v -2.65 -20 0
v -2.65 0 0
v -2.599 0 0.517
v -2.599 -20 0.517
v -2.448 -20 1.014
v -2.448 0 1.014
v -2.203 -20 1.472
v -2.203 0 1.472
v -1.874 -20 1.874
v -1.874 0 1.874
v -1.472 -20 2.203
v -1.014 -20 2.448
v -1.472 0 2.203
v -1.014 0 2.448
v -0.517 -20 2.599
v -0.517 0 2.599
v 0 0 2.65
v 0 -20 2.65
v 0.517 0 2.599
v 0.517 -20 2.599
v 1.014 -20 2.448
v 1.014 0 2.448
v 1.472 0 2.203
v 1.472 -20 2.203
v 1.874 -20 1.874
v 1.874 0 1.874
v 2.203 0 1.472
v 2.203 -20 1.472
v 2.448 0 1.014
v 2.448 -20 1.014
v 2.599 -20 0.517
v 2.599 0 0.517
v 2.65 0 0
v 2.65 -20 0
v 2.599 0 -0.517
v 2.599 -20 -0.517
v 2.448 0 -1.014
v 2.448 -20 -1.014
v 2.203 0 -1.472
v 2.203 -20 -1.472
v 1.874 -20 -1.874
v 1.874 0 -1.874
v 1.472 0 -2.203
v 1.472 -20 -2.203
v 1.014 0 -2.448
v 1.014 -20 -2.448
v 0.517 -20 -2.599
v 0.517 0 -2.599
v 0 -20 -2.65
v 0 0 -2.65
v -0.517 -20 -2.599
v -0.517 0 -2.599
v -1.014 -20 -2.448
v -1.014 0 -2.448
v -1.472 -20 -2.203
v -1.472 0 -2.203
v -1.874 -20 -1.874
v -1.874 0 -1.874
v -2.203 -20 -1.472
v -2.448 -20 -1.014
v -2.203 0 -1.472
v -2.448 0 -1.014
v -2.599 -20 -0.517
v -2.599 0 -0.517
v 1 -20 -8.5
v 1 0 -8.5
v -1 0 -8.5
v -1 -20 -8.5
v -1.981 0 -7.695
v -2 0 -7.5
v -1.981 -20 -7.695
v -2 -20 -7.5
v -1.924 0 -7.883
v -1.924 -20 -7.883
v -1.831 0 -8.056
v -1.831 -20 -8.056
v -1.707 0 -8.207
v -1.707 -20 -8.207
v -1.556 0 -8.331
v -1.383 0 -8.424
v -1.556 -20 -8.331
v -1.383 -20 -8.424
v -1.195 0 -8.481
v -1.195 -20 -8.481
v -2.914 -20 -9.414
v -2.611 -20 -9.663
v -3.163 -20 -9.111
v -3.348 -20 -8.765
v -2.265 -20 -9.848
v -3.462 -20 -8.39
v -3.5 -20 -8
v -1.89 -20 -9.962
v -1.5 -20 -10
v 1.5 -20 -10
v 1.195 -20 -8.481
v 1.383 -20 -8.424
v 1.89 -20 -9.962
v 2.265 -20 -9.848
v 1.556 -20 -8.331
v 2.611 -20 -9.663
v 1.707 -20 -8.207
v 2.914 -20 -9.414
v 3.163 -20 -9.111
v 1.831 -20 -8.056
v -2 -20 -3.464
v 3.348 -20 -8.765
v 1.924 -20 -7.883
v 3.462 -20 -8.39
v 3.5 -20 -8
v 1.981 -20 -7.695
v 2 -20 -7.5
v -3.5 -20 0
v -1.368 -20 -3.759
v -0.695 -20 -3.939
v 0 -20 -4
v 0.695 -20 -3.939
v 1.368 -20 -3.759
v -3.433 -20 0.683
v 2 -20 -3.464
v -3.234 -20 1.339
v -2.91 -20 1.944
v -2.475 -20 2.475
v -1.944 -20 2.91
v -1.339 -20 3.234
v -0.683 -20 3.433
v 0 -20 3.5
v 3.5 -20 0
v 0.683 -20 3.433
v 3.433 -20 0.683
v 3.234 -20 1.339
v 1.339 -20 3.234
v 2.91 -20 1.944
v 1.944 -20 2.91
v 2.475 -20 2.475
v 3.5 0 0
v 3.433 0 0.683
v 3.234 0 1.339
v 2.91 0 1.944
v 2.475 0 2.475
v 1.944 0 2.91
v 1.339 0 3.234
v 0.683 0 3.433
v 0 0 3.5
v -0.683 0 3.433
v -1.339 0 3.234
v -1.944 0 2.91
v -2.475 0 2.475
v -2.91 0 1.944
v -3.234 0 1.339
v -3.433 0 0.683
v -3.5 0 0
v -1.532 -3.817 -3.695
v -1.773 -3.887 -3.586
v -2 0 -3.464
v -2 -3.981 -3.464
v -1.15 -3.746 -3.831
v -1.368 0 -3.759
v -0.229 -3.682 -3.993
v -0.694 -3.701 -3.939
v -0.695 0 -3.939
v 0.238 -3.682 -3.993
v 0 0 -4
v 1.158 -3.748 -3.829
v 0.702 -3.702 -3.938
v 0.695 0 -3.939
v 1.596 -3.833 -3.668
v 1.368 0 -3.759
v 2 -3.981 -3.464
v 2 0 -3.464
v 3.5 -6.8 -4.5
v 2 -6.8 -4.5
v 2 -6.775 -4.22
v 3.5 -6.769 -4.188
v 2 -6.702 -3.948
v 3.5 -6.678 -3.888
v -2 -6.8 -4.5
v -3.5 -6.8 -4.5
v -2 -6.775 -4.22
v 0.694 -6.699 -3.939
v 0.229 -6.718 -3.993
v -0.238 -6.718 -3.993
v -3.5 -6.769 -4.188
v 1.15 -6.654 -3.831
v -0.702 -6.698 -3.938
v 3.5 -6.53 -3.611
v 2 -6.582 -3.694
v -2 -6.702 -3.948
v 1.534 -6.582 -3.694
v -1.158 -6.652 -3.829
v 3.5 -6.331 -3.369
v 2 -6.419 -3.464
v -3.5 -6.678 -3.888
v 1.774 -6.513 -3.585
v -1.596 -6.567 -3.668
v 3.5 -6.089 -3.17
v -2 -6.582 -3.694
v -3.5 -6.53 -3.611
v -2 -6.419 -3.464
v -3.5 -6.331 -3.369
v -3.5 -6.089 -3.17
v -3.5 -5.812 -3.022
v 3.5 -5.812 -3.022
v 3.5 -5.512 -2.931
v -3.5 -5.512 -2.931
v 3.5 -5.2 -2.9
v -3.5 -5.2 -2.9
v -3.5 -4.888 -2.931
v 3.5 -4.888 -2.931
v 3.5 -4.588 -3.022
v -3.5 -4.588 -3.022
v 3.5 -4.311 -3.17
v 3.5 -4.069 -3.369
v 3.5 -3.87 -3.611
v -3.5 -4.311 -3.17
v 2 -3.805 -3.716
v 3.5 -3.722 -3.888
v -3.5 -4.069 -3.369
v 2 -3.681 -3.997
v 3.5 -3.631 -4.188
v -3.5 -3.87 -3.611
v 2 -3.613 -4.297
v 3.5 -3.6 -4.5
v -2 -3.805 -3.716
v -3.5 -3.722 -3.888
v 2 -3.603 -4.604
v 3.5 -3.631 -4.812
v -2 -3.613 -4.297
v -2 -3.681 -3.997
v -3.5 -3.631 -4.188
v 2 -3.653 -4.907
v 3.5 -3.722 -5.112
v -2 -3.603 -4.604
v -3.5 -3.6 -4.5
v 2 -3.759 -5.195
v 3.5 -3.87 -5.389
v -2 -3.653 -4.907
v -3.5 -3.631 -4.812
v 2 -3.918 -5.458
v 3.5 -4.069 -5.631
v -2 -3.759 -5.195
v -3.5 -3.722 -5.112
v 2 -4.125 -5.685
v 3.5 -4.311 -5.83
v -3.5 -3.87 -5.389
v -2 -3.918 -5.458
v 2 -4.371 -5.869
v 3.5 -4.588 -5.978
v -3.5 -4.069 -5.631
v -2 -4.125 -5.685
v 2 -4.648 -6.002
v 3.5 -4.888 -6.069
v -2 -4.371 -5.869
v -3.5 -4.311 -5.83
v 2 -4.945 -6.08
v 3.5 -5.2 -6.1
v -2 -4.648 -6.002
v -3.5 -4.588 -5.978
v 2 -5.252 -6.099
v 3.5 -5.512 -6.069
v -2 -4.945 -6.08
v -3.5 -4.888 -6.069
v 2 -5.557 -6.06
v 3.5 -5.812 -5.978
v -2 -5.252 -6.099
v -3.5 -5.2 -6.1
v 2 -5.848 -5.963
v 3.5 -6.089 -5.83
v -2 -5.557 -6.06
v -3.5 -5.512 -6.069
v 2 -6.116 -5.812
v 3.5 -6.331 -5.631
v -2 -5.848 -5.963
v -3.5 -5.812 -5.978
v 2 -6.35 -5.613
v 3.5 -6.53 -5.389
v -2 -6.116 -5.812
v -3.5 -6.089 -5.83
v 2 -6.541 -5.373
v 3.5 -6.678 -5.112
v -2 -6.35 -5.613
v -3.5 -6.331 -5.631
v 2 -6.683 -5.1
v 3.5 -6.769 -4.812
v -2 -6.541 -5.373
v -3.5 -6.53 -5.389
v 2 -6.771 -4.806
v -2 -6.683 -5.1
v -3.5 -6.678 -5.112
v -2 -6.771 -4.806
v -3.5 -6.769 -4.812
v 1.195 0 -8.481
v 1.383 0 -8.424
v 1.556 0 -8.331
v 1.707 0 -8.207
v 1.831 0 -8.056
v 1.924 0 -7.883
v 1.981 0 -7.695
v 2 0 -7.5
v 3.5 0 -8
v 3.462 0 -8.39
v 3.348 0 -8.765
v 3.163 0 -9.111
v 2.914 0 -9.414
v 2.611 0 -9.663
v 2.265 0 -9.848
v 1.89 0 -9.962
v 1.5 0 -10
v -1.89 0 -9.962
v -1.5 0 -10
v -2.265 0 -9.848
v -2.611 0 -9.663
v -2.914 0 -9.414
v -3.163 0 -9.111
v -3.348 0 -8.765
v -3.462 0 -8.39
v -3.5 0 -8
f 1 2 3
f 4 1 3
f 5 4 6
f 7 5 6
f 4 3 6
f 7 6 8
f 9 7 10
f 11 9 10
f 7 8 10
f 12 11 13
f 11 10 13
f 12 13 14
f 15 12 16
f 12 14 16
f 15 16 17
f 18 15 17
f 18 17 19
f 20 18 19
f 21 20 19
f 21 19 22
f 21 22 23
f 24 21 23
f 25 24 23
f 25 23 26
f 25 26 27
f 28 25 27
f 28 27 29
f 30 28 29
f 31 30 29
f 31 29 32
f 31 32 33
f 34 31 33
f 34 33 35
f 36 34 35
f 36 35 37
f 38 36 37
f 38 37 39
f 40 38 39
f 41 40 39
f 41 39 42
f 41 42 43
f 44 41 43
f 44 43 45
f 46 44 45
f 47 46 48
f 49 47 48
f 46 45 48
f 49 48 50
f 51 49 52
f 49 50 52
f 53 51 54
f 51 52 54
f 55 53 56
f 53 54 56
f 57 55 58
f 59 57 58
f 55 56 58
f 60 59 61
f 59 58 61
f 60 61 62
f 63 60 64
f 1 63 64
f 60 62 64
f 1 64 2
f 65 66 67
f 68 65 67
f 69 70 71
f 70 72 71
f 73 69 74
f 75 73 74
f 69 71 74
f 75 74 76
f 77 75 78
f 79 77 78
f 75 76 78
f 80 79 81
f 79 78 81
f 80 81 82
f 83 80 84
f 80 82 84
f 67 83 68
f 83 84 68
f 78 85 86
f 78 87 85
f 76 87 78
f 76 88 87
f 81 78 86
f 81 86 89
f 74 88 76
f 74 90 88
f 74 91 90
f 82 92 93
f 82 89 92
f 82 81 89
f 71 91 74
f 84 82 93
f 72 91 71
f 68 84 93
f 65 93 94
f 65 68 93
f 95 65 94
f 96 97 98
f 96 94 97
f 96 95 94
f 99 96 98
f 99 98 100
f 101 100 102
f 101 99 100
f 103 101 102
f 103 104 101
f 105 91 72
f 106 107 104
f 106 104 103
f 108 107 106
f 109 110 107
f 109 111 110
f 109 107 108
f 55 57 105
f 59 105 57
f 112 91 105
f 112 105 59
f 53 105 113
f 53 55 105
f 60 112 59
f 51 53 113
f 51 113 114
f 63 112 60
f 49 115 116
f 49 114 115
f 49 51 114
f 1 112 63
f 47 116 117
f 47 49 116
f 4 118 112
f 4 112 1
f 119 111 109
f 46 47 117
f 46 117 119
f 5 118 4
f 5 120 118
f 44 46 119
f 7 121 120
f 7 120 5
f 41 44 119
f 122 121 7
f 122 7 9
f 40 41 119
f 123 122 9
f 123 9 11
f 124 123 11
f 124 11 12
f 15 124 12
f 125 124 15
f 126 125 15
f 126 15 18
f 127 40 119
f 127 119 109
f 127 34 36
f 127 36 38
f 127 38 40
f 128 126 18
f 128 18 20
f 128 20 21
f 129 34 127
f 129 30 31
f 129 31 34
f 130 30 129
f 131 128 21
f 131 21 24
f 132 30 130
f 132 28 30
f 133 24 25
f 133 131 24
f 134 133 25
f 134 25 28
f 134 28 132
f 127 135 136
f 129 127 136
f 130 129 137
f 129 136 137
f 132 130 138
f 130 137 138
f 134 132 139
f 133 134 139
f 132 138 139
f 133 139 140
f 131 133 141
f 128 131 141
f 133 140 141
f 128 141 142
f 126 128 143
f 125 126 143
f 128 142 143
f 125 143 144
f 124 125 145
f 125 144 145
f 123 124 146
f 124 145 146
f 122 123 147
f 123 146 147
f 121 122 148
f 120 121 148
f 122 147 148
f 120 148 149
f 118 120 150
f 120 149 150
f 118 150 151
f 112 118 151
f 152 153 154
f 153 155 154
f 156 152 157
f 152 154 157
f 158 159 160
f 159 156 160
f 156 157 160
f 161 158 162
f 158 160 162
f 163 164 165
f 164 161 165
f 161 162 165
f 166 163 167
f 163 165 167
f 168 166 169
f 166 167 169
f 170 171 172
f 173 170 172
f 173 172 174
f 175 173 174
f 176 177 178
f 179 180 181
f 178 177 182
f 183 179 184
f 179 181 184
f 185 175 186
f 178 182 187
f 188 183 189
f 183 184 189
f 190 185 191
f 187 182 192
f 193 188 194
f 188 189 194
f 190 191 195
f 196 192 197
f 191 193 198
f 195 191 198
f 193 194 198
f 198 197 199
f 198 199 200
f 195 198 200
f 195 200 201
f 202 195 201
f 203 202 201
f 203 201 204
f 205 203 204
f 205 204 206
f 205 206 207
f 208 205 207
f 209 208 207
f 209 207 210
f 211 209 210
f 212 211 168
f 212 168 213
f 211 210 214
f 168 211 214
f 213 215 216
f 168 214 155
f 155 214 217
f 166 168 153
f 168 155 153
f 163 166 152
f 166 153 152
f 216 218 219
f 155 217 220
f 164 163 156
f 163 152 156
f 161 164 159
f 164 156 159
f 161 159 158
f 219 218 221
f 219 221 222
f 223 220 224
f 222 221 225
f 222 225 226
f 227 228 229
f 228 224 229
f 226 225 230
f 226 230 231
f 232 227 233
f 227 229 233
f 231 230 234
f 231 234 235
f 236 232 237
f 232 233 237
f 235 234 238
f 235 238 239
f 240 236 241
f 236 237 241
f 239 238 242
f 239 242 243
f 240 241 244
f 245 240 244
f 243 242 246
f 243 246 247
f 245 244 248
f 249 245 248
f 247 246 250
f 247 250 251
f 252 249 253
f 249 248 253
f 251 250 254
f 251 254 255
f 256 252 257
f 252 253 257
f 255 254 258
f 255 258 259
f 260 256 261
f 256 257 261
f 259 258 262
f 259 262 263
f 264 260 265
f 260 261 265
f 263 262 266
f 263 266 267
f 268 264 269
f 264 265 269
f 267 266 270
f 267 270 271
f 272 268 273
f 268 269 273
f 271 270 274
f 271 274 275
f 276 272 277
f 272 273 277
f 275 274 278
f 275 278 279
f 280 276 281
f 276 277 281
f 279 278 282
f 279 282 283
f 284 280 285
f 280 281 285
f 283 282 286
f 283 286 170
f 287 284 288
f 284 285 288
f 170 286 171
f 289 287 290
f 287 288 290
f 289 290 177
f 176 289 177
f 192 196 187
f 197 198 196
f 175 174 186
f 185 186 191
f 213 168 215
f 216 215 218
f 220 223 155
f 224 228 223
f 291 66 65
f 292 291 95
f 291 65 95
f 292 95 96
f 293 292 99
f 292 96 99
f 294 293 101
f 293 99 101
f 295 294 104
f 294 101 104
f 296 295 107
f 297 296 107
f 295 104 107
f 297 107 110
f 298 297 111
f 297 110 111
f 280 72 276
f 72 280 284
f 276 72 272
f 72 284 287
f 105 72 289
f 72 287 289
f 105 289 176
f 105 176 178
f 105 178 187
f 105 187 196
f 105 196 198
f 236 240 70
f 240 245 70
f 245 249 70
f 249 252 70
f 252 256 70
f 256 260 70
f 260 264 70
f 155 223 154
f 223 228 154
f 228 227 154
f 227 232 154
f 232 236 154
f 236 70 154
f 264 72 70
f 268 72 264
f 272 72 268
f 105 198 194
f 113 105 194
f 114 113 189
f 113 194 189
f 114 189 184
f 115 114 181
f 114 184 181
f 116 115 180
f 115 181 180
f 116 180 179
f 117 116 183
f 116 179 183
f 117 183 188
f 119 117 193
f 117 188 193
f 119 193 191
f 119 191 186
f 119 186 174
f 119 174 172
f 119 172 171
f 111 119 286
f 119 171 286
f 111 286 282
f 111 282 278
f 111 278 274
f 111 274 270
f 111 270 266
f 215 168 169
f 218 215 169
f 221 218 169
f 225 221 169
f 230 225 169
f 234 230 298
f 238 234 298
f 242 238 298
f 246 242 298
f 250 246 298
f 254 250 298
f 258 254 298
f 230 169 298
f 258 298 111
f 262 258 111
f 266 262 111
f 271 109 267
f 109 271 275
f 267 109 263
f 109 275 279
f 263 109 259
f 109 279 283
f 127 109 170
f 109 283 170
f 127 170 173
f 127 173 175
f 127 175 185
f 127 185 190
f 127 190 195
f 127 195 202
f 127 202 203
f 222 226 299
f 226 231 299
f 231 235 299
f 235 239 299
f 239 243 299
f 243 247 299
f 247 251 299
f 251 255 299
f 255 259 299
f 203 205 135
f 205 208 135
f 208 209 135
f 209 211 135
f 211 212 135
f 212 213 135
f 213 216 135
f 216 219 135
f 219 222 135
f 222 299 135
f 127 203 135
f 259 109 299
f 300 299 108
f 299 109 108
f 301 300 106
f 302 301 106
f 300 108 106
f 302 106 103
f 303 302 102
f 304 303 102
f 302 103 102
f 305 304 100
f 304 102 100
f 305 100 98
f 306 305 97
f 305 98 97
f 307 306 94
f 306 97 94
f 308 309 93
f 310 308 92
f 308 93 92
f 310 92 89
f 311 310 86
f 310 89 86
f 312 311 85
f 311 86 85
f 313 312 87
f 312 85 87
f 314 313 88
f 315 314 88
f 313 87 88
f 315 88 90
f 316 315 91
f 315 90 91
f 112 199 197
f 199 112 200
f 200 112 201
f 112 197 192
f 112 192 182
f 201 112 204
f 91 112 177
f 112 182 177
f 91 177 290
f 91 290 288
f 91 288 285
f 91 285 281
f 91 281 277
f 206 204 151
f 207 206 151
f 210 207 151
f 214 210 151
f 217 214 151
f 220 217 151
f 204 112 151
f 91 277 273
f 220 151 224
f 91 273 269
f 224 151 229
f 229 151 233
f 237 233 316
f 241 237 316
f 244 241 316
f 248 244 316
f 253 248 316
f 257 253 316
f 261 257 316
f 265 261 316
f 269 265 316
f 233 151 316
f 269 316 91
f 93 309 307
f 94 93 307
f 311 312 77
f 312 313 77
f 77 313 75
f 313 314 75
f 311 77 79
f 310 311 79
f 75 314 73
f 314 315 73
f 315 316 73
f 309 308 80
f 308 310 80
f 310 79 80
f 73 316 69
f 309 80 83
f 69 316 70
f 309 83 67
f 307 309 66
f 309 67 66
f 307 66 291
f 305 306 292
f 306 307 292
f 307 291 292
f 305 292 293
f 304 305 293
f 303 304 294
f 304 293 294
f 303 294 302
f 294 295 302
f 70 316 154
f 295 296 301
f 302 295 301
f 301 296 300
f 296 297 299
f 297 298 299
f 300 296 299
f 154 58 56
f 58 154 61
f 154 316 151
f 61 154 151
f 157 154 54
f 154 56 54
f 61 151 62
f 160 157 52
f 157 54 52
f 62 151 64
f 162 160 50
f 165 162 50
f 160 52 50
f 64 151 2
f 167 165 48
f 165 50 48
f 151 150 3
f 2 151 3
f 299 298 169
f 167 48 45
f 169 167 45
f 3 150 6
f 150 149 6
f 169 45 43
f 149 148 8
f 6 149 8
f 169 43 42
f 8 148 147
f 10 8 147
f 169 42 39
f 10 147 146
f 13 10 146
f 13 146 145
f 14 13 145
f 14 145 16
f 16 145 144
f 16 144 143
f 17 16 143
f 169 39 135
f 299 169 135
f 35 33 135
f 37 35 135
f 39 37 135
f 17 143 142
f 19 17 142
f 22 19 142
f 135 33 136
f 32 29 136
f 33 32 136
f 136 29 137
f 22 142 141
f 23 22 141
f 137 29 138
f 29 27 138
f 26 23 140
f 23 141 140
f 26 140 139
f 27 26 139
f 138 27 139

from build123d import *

# Parameters (mm, degrees)
F1_DEPTH = 20
F2_R     = 2.65
F3_DEPTH = 20.001
F4_R     = 1.6
F5_DEPTH = 7.001
F6_R     = 2
F7_R     = 1


with BuildPart() as f1:
    # F0 (on Front) → F1 (new body)
    with BuildSketch(Plane.XZ):
        with BuildLine():
            Line((3.5, -10), (3.5, 0))
            ThreePointArc((3.5, 0), (0, 3.5), (-3.5, 0))
            Line((-3.5, 0), (-3.5, -10))
            Line((-3.5, -10), (3.5, -10))
        make_face()
    extrude(amount=F1_DEPTH)

    # F2 (on face) → F3 (cut, through all)
    with BuildSketch(Plane(origin=(0, 0, 0), x_dir=(-1, 0, 0), z_dir=(0, 1, 0))):
        Circle(F2_R)
        with BuildLine():
            ThreePointArc((2, -3.464102), (0, -4), (-2, -3.464102))
            Line((-2, -3.464102), (-2, -8.5))
            Line((-2, -8.5), (2, -8.5))
            Line((2, -8.5), (2, -3.464102))
        make_face()
    extrude(amount=-F3_DEPTH, mode=Mode.SUBTRACT)

    # F4 (on face) → F5 (cut, through all)
    with BuildSketch(Plane(origin=(-3.5, 0, 0), x_dir=(0, -1, 0), z_dir=(-1, 0, 0))):
        with Locations((5.2, -4.5)):
            Circle(F4_R)
    extrude(amount=-F5_DEPTH, mode=Mode.SUBTRACT)

    # F6
    f6_edges = [f1.edges().sort_by_distance(p)[0] for p in [
        (-3.5, -10, -10),
        (3.5, -10, -10),
    ]]
    fillet(f6_edges, radius=F6_R)

    # F7
    f7_edges = [f1.edges().sort_by_distance(p)[0] for p in [
        (2, -10, -8.5),
        (-2, -10, -8.5),
    ]]
    fillet(f7_edges, radius=F7_R)


solid = f1.part
